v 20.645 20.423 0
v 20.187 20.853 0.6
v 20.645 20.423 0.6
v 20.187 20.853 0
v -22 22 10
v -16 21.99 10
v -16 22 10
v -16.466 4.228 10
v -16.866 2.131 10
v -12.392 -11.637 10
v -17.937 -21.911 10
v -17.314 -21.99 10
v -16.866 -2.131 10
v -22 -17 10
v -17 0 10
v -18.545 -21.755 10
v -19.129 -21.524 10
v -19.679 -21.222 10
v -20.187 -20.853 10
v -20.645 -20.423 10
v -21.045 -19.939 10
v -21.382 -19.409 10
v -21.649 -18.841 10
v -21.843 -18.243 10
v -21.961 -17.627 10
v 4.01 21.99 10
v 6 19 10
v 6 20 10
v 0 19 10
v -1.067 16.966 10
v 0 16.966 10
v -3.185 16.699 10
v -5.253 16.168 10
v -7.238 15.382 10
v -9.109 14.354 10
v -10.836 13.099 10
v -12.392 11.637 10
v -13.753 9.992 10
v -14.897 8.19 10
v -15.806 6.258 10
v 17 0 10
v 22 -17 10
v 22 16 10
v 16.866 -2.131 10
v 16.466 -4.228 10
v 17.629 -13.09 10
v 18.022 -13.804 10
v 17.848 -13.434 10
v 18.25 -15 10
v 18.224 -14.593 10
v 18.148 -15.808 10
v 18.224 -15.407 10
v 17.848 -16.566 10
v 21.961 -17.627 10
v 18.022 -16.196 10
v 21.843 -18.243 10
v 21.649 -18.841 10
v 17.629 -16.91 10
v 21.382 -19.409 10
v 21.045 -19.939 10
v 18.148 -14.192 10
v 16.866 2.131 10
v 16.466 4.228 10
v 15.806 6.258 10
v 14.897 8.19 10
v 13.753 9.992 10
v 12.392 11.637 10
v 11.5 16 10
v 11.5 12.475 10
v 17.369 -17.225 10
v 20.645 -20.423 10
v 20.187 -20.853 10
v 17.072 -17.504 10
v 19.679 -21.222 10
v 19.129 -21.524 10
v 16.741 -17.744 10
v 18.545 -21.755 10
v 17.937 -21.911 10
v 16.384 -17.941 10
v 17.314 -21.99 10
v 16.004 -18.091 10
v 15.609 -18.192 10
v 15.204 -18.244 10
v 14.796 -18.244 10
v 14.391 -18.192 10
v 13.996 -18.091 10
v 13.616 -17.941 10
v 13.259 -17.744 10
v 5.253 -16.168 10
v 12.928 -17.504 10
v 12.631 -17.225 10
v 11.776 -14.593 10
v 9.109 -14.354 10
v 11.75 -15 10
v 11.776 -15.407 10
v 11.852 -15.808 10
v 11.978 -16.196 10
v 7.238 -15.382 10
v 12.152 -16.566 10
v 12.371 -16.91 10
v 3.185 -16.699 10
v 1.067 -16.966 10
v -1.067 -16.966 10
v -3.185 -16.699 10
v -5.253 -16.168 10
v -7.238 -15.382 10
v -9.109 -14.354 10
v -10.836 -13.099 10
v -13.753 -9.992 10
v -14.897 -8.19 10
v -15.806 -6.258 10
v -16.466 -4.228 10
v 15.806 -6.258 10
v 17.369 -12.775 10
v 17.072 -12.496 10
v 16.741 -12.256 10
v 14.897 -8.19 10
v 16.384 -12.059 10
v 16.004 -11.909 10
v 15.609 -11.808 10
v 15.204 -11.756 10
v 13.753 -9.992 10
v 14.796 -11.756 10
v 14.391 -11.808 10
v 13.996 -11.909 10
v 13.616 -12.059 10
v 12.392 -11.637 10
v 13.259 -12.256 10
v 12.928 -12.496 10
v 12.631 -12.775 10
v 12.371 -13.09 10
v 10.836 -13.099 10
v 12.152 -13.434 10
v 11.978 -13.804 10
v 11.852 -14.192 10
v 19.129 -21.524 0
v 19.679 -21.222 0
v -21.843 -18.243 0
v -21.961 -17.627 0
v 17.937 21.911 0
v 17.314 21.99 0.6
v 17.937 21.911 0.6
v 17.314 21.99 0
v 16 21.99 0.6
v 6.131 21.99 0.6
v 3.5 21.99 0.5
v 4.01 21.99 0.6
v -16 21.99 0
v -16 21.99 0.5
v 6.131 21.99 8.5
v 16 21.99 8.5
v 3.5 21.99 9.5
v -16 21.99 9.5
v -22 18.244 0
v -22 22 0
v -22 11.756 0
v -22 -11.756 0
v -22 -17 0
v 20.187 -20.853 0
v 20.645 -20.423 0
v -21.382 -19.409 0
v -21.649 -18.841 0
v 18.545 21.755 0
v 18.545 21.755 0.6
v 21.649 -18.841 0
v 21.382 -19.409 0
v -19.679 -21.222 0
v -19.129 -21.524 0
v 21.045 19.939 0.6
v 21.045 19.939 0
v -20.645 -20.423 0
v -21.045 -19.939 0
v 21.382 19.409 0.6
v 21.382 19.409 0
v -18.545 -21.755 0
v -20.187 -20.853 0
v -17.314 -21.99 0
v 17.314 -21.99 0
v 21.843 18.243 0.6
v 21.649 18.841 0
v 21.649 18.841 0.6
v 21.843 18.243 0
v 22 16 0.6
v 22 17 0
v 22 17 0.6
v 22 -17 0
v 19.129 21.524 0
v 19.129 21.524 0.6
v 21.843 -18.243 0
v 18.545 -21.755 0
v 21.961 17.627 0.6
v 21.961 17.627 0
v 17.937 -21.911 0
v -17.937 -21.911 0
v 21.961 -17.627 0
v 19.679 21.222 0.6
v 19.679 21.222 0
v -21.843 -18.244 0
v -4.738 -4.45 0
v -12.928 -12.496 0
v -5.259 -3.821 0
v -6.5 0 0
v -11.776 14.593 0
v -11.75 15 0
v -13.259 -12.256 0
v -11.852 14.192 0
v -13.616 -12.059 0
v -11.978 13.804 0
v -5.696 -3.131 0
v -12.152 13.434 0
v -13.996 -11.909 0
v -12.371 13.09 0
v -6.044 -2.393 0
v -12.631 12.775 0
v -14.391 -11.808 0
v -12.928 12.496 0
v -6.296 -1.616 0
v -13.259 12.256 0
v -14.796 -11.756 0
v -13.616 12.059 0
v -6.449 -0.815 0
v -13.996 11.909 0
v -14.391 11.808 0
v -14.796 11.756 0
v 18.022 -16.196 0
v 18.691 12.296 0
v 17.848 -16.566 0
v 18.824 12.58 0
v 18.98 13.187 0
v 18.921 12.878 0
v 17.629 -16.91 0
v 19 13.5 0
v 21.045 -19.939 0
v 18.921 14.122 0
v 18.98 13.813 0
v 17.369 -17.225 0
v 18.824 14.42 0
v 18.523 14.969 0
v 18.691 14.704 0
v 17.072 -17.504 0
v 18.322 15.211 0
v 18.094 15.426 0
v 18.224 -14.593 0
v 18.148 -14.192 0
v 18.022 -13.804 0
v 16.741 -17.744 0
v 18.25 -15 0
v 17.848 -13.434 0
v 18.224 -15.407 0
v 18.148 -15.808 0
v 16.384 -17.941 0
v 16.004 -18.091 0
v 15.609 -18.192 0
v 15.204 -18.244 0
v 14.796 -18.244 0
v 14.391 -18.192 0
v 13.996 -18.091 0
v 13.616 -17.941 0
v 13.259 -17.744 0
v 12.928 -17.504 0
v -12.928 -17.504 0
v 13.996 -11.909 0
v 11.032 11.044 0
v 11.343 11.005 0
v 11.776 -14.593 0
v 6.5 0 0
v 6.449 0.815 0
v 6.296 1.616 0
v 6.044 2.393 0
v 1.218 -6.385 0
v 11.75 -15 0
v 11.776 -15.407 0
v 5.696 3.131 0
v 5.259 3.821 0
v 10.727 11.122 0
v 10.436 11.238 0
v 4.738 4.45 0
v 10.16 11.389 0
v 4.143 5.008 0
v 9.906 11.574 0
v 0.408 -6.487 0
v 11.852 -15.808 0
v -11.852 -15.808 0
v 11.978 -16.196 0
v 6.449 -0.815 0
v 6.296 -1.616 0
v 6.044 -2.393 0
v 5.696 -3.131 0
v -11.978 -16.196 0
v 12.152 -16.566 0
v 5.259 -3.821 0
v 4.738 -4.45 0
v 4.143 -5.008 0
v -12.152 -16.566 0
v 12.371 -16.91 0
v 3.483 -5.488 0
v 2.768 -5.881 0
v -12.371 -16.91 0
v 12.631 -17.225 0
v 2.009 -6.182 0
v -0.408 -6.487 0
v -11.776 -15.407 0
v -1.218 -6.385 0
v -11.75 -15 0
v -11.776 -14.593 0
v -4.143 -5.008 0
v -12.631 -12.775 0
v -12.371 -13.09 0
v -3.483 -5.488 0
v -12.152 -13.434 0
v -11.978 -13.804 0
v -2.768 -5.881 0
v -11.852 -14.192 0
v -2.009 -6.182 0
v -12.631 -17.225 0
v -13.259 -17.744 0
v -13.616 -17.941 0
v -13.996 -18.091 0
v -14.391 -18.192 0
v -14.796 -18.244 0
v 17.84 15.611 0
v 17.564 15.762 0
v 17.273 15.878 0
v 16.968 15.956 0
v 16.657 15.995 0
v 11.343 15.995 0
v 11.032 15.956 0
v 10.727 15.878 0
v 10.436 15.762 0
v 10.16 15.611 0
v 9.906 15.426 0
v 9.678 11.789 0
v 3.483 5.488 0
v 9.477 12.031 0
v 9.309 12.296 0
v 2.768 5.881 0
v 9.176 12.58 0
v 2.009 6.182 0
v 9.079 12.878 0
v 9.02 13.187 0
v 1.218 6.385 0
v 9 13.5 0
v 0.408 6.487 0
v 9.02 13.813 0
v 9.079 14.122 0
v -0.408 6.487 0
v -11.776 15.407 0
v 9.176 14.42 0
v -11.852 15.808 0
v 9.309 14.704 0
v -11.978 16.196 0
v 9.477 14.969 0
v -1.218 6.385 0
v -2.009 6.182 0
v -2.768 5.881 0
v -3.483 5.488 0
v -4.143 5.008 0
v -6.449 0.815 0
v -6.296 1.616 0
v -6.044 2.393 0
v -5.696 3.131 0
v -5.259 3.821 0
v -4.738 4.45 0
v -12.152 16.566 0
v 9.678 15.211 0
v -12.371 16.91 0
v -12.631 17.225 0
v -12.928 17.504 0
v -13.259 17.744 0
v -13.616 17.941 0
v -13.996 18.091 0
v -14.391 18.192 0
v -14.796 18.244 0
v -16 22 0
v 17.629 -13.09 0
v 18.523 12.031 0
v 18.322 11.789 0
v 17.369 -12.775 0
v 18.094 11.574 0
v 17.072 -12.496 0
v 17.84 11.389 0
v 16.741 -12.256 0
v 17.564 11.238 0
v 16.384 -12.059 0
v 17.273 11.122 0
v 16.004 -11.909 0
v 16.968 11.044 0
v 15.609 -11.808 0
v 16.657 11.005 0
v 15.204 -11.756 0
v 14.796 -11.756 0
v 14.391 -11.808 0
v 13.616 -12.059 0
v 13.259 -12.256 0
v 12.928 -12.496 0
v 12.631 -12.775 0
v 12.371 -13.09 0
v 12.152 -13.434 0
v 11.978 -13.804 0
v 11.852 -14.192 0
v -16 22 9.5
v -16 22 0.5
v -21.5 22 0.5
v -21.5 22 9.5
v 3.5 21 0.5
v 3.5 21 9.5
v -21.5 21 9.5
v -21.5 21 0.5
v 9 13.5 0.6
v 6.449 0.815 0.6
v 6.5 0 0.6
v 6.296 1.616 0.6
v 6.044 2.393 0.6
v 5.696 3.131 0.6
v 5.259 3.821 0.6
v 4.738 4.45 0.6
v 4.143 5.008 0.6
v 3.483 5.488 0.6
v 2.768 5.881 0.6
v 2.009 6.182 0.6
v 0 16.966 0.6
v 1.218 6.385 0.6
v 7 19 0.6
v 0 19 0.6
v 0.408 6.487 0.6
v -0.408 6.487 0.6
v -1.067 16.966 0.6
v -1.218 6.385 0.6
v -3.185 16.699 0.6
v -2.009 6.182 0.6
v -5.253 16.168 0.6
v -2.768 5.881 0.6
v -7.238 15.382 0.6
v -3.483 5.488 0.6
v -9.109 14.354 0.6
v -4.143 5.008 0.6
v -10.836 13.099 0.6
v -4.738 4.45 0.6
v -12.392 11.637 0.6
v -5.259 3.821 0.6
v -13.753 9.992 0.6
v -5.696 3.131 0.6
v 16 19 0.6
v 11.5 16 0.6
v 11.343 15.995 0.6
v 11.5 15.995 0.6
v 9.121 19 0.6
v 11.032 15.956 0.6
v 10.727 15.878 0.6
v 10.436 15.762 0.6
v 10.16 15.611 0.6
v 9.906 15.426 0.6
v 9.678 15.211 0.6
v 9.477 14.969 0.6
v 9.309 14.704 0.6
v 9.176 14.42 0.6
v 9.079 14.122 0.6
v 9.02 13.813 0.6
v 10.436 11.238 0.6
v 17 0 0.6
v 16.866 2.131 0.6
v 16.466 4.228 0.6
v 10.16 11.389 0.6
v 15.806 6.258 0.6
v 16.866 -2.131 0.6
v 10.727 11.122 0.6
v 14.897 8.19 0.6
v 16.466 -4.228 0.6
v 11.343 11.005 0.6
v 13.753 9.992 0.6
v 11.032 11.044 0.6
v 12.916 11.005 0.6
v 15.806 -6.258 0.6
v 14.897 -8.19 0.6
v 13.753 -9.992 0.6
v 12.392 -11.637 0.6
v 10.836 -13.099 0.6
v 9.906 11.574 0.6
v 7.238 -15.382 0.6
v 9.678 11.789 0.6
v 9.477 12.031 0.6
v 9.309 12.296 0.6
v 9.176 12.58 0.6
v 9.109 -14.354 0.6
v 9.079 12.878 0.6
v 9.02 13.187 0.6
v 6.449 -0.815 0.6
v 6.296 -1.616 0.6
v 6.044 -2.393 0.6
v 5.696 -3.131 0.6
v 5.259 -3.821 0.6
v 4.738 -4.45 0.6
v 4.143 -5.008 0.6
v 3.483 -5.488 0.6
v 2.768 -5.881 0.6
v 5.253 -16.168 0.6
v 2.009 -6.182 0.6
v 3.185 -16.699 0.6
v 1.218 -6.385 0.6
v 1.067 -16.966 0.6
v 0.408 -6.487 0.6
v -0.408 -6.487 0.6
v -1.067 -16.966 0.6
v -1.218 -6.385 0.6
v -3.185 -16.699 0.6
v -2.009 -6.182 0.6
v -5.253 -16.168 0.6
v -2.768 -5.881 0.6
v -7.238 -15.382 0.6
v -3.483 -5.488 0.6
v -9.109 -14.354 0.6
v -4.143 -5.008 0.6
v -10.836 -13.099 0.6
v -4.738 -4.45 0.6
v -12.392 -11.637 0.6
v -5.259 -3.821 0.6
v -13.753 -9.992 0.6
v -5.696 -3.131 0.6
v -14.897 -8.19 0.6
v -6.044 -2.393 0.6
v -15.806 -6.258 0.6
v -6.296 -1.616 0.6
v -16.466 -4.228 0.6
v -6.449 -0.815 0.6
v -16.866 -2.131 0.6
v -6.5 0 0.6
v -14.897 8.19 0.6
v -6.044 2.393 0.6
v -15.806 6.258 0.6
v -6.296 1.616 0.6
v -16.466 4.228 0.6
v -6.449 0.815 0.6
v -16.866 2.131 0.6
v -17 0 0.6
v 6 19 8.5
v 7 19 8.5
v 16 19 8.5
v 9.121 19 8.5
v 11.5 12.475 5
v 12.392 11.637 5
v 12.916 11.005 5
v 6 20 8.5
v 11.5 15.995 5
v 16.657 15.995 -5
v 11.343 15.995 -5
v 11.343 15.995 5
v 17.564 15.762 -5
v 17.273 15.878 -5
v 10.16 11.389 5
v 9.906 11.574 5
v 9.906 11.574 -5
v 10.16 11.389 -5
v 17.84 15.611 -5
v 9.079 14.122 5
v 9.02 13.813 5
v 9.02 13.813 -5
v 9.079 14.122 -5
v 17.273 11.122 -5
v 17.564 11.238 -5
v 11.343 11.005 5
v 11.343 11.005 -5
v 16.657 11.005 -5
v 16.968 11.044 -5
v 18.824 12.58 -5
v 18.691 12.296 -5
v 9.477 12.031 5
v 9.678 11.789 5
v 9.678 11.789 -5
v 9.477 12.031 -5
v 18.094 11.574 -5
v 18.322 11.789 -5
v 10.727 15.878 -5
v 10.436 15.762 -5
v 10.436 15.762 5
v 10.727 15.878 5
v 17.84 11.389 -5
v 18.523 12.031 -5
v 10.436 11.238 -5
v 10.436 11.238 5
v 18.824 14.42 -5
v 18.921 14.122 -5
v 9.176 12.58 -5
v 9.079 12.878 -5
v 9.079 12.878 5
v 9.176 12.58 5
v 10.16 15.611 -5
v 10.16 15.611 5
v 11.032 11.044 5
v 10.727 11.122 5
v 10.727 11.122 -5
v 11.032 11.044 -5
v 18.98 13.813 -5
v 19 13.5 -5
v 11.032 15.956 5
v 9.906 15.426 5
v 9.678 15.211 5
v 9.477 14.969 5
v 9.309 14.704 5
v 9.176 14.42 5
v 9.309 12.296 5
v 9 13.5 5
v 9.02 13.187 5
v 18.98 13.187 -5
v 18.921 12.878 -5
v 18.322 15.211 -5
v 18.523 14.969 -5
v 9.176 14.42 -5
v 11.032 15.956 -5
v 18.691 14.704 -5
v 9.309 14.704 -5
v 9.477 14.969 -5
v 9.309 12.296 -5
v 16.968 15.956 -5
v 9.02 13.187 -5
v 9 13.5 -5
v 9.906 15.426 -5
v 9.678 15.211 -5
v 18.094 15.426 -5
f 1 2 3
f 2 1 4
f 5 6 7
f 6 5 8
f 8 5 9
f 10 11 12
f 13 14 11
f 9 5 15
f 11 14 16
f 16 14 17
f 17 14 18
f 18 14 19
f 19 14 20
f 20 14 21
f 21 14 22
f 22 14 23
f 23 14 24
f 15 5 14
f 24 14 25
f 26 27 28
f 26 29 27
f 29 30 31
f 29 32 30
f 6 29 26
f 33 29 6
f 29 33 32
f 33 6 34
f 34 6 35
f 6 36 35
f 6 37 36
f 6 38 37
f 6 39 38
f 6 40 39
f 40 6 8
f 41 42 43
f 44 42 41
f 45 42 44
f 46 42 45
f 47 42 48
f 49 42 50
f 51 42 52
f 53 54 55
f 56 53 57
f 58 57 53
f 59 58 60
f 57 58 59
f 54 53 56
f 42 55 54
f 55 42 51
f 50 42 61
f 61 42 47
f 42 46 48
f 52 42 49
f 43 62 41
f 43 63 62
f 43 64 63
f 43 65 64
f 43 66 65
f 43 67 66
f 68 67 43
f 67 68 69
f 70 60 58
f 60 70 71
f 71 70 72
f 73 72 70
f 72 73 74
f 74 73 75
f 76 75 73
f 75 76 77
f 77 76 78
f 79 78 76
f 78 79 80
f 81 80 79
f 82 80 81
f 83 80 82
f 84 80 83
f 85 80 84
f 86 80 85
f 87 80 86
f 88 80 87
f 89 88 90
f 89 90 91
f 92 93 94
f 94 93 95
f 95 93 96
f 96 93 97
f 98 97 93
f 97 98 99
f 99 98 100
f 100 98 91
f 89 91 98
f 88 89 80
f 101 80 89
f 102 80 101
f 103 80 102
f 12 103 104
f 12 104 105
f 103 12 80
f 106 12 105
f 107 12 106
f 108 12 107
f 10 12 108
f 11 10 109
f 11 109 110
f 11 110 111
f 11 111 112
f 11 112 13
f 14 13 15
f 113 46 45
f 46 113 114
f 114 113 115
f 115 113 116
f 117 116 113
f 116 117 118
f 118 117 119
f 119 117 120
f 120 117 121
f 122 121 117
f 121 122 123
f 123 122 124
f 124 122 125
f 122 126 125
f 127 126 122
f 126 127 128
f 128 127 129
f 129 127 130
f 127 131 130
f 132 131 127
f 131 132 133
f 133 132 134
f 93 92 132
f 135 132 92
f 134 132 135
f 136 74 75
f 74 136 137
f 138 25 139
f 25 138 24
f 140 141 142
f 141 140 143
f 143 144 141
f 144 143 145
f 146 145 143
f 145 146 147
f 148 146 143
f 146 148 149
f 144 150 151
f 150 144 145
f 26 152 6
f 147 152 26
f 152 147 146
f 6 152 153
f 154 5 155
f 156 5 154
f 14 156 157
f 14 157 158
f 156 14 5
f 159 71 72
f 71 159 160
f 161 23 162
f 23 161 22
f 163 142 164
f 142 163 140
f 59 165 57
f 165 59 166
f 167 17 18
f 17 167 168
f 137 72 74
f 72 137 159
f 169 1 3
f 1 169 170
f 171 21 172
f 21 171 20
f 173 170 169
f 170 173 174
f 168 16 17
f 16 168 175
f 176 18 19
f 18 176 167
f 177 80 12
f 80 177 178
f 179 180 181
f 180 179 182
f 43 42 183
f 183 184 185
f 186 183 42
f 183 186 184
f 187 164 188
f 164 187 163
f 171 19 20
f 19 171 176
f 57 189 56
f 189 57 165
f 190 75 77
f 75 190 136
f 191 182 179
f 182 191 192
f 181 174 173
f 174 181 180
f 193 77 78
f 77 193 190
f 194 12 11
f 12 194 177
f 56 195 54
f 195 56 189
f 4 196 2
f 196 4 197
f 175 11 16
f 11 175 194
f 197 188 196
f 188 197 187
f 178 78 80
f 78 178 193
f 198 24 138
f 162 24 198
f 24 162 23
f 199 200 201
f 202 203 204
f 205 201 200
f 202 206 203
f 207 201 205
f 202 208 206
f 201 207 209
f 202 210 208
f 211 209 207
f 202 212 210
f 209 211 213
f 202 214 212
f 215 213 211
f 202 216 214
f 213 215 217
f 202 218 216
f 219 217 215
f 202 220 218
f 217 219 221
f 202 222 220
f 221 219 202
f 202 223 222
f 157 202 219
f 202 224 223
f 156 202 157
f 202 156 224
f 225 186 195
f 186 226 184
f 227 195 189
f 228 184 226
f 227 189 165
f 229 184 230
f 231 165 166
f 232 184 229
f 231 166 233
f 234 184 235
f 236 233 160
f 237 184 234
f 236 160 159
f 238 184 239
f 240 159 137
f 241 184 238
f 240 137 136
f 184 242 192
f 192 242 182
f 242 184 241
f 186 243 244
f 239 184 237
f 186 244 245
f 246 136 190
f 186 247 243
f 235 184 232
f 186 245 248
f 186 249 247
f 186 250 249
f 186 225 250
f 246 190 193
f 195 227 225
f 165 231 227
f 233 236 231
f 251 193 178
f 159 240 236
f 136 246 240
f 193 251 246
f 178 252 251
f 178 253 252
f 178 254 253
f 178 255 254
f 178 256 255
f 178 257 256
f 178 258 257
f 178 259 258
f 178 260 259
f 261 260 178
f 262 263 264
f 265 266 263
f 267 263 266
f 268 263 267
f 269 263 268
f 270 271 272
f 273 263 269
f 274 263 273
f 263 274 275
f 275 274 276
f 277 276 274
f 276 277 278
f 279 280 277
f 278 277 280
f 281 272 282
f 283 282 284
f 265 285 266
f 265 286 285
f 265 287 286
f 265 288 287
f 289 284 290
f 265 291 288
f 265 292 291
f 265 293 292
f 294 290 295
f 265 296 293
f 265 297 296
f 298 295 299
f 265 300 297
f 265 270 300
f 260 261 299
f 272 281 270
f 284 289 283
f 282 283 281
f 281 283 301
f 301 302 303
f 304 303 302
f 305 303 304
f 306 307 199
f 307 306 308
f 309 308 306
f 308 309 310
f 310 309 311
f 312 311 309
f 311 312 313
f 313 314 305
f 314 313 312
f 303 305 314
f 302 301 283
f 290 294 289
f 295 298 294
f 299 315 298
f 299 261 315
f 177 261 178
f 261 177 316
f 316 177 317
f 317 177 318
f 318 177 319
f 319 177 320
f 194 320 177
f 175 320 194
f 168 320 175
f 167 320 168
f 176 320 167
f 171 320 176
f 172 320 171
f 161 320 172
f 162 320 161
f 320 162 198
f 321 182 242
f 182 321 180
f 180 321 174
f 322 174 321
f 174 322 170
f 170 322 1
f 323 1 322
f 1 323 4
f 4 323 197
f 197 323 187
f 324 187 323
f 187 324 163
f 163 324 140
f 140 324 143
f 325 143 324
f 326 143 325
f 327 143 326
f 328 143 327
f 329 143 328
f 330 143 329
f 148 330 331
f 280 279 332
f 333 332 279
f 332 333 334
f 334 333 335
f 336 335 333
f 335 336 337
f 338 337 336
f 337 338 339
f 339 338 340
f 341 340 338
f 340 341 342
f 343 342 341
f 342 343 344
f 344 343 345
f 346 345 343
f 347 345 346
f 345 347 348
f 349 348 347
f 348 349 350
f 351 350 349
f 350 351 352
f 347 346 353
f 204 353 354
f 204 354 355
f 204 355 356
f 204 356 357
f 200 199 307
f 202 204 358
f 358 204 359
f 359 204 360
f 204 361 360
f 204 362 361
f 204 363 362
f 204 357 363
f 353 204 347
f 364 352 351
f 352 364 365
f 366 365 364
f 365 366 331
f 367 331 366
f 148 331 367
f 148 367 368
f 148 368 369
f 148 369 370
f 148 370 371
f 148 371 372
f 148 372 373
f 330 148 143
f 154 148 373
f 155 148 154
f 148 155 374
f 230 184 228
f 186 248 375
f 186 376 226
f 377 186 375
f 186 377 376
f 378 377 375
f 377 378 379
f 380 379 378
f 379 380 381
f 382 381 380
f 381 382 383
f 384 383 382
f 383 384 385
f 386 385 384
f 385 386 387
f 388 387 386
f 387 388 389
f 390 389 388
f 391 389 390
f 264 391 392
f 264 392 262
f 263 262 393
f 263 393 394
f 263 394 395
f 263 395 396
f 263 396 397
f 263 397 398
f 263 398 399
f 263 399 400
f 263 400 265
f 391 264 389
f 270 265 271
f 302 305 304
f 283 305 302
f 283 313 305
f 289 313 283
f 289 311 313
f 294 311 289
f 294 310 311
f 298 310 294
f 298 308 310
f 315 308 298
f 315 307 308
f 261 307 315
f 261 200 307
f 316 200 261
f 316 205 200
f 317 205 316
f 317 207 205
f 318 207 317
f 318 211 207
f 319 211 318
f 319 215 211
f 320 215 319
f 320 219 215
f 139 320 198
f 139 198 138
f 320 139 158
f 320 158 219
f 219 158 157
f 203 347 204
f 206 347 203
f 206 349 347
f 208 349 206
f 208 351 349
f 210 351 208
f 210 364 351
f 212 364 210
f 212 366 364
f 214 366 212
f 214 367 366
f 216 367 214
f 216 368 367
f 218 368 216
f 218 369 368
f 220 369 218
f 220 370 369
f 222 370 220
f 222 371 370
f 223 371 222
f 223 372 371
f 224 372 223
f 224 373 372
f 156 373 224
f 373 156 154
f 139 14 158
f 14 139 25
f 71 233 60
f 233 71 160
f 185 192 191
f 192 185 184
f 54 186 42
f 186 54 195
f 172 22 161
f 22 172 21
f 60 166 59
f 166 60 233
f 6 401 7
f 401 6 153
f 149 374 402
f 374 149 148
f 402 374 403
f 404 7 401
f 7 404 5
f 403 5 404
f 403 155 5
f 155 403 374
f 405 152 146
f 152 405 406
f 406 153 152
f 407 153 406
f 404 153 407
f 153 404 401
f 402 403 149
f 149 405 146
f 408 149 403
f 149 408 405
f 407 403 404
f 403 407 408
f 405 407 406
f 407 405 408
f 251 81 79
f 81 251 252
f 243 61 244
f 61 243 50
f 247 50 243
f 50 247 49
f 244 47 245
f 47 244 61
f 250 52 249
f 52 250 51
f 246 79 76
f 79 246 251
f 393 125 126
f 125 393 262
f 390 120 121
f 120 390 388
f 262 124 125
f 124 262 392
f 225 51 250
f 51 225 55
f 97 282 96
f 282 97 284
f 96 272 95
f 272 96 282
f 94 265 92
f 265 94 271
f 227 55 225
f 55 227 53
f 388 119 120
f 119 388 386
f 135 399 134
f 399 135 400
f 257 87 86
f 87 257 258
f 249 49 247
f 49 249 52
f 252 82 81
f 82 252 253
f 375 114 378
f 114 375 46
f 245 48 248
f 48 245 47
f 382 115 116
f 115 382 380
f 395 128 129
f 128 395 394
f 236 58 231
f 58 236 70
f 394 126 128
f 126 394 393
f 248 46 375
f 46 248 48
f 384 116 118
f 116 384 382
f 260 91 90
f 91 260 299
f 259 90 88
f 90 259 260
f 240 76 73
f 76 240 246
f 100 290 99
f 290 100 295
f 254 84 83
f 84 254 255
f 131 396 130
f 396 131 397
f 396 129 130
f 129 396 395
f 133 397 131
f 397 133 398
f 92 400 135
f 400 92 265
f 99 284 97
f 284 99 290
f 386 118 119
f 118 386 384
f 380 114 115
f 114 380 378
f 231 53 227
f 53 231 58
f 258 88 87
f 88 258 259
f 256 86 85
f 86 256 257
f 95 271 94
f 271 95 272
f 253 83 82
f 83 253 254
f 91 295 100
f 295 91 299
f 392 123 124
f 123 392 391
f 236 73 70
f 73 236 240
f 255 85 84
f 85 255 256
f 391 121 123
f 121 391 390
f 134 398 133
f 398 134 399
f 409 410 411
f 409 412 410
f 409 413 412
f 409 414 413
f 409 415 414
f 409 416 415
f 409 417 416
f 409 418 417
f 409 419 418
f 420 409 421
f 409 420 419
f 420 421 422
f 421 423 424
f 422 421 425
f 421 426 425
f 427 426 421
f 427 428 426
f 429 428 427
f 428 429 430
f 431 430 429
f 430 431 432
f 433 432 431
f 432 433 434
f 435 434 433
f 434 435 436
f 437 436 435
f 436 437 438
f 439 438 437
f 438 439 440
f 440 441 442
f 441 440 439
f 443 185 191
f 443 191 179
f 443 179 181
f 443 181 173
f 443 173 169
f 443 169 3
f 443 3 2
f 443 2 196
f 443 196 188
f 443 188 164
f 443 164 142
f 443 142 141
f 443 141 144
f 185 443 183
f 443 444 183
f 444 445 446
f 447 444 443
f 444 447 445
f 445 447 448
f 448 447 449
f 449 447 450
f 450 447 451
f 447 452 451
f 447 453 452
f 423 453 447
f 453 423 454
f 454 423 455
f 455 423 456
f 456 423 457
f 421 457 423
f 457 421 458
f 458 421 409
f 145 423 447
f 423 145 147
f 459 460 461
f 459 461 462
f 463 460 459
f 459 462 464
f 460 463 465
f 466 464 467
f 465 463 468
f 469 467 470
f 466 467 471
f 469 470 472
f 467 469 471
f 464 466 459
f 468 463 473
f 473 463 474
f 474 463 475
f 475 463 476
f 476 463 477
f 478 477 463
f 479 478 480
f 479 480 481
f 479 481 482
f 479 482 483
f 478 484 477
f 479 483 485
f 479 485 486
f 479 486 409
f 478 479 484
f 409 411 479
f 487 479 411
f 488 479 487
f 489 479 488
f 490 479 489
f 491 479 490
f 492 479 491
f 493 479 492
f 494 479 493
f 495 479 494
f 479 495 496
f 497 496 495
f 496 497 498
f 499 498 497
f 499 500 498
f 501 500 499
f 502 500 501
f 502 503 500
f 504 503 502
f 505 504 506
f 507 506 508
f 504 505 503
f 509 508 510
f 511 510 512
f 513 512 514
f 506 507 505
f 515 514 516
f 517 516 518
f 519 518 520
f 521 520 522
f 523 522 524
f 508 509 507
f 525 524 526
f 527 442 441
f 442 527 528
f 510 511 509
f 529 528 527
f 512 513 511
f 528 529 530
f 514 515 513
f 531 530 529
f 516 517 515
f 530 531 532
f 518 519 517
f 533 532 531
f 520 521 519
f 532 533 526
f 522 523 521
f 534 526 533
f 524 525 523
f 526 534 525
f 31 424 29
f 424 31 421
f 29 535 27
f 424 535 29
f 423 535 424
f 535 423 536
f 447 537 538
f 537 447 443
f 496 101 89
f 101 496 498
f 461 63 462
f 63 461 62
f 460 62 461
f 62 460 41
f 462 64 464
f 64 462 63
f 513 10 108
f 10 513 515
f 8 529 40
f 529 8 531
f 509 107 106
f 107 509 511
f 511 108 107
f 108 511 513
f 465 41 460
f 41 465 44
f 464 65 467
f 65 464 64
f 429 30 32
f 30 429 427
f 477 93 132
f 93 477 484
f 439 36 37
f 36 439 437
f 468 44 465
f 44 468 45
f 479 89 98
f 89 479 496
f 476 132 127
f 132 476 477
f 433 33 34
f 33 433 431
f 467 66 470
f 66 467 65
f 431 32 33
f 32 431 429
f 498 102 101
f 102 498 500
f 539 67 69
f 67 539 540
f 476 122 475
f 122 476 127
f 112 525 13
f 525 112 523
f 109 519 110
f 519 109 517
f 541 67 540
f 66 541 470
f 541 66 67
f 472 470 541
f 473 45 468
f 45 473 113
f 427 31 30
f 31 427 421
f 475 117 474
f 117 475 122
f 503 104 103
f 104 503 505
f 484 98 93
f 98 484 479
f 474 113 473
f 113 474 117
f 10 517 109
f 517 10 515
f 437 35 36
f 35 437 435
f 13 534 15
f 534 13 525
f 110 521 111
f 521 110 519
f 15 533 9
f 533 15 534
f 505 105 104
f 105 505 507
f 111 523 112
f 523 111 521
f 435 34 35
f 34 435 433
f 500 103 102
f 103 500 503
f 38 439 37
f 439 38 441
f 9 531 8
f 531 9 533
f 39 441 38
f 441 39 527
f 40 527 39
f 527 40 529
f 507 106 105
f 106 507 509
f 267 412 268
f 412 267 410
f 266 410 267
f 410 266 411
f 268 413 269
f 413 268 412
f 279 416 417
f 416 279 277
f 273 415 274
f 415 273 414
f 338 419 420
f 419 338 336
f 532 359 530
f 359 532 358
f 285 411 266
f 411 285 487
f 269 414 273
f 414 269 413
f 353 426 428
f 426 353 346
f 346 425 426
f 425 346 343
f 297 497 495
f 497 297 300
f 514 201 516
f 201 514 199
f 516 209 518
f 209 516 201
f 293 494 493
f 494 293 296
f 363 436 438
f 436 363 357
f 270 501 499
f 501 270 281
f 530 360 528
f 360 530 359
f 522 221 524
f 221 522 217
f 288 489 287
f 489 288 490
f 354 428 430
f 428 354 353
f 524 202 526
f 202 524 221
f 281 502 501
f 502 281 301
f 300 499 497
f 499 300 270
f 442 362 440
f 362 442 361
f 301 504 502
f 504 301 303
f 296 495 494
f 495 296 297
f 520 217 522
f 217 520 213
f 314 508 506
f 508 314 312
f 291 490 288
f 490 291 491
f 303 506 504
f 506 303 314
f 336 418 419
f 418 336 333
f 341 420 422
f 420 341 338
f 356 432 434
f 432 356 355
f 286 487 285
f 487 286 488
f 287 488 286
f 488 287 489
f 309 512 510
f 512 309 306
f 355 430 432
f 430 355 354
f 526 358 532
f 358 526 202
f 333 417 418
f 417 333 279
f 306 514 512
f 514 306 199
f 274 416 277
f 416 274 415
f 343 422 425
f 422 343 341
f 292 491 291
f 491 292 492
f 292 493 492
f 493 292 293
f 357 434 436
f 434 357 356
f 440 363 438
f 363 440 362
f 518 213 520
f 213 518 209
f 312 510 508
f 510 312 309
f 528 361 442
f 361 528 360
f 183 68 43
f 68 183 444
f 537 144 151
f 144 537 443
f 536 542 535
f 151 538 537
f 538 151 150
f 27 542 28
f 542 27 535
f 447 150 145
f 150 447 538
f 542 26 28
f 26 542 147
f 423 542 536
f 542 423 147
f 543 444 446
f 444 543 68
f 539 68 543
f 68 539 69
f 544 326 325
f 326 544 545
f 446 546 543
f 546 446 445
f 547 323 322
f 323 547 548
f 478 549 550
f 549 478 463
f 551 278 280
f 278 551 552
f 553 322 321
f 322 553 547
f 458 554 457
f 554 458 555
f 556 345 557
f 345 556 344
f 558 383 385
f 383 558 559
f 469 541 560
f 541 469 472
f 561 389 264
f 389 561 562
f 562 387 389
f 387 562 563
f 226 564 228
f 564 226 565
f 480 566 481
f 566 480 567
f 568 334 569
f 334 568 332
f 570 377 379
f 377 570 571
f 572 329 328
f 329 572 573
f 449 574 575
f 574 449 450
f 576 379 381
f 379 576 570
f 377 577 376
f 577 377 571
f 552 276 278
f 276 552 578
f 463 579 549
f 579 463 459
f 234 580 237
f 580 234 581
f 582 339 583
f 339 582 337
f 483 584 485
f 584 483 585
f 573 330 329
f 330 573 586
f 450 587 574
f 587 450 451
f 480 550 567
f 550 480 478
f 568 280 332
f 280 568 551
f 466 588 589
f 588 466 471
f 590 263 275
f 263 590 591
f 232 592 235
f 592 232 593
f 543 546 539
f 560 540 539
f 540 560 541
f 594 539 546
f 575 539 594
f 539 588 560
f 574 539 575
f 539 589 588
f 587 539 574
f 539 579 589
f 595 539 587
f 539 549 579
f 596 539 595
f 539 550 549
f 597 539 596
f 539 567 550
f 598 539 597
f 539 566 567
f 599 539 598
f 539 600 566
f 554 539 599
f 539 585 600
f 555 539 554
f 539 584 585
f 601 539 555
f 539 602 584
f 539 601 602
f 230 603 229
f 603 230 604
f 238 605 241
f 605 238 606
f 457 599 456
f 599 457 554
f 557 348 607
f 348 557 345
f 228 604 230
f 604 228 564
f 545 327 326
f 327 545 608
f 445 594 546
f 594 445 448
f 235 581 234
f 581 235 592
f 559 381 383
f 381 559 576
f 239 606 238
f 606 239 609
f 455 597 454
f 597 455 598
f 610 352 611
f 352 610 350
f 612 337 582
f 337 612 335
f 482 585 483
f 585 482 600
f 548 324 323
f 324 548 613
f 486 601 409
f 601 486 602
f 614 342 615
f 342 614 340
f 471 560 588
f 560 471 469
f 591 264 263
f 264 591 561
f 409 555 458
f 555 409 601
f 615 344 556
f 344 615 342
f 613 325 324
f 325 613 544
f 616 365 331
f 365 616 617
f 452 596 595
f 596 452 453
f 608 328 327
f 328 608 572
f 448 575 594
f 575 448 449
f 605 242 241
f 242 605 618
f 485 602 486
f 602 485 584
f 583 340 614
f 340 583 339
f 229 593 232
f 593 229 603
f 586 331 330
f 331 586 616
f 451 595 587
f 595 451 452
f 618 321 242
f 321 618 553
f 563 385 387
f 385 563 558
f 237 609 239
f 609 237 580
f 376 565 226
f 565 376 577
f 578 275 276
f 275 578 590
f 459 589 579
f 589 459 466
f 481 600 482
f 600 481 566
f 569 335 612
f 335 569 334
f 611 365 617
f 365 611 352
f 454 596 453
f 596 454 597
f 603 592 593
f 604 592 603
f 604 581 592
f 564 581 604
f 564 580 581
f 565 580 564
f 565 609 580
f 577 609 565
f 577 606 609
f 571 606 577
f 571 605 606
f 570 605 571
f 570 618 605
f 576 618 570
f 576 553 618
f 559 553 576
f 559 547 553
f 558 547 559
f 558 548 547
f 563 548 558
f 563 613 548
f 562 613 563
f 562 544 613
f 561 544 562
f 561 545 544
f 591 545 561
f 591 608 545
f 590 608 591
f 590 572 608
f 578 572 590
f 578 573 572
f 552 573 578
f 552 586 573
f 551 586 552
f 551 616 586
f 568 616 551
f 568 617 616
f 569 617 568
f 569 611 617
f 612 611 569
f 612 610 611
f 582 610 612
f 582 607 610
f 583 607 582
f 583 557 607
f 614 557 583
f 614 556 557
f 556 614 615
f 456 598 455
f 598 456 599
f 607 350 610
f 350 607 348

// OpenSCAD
$fn = 50;


union() {
	difference() {
		union() {
			hull() {
				translate(v = [-17.0000000000, 17.0000000000, 0]) {
					cylinder(h = 10, r = 5);
				}
				translate(v = [17.0000000000, 17.0000000000, 0]) {
					cylinder(h = 10, r = 5);
				}
				translate(v = [-17.0000000000, -17.0000000000, 0]) {
					cylinder(h = 10, r = 5);
				}
				translate(v = [17.0000000000, -17.0000000000, 0]) {
					cylinder(h = 10, r = 5);
				}
			}
			translate(v = [-22.0000000000, 16.0000000000, 0]) {
				cube(size = [6, 6, 10]);
			}
		}
		union() {
			translate(v = [-22.5000000000, -15.0000000000, -250.0000000000]) {
				rotate(a = [0, 0, 0]) {
					difference() {
						union() {
							hull() {
								translate(v = [7.5000000000, 0, 0]) {
									cylinder(h = 250, r = 3.2500000000, r1 = 3.2500000000, r2 = 3.2500000000);
								}
								translate(v = [-7.5000000000, 0, 0]) {
									cylinder(h = 250, r = 3.2500000000, r1 = 3.2500000000, r2 = 3.2500000000);
								}
							}
						}
						union();
					}
				}
			}
			translate(v = [-22.5000000000, 15.0000000000, -250.0000000000]) {
				rotate(a = [0, 0, 0]) {
					difference() {
						union() {
							hull() {
								translate(v = [7.5000000000, 0, 0]) {
									cylinder(h = 250, r = 3.2500000000, r1 = 3.2500000000, r2 = 3.2500000000);
								}
								translate(v = [-7.5000000000, 0, 0]) {
									cylinder(h = 250, r = 3.2500000000, r1 = 3.2500000000, r2 = 3.2500000000);
								}
							}
						}
						union();
					}
				}
			}
			translate(v = [-21.5000000000, 21.0000000000, 0.5000000000]) {
				cube(size = [25, 1, 9.0000000000]);
			}
			translate(v = [15.0000000000, -15.0000000000, 0]) {
				cylinder(h = 100, r = 3.2500000000);
			}
			translate(v = [0.0000000000, 11.0000000000, 0.6000000000]) {
				cube(size = [11, 8, 12.4000000000]);
			}
			translate(v = [0, 0, 0.6000000000]) {
				cylinder(h = 12.4000000000, r = 17.0000000000);
			}
			translate(v = [0, 0, -5.0000000000]) {
				cylinder(h = 10, r = 6.5000000000);
			}
			translate(v = [0.0000000000, 16.0000000000, 0.6000000000]) {
				cube(size = [22.0000000000, 3, 12.4000000000]);
			}
			translate(v = [16.0000000000, 16.0000000000, 0.6000000000]) {
				cube(size = [6, 6, 12.4000000000]);
			}
			translate(v = [6.0000000000, 16.0000000000, 8.5000000000]) {
				cube(size = [16, 6, 1.5000000000]);
			}
			translate(v = [3.2500000000, 22.7500000000, 0.6000000000]) {
				rotate(a = [0, 0, -45]) {
					cube(size = [7.5000000000, 1.5000000000, 12.4000000000]);
				}
			}
			translate(v = [2.5000000000, 11.0000000000, 0.6000000000]) {
				cube(size = [9.0000000000, 5, 9.4000000000]);
			}
		}
	}
	union() {
		translate(v = [14, 13.5000000000, -5.0000000000]) {
			rotate(a = [0, 0, 0]) {
				difference() {
					union() {
						#hull() {
							#translate(v = [2.5000000000, 0, 0]) {
								cylinder(h = 10, r = 2.5000000000, r1 = 2.5000000000, r2 = 2.5000000000);
							}
							#translate(v = [-2.5000000000, 0, 0]) {
								cylinder(h = 10, r = 2.5000000000, r1 = 2.5000000000, r2 = 2.5000000000);
							}
						}
					}
					union();
				}
			}
		}
	}
}
